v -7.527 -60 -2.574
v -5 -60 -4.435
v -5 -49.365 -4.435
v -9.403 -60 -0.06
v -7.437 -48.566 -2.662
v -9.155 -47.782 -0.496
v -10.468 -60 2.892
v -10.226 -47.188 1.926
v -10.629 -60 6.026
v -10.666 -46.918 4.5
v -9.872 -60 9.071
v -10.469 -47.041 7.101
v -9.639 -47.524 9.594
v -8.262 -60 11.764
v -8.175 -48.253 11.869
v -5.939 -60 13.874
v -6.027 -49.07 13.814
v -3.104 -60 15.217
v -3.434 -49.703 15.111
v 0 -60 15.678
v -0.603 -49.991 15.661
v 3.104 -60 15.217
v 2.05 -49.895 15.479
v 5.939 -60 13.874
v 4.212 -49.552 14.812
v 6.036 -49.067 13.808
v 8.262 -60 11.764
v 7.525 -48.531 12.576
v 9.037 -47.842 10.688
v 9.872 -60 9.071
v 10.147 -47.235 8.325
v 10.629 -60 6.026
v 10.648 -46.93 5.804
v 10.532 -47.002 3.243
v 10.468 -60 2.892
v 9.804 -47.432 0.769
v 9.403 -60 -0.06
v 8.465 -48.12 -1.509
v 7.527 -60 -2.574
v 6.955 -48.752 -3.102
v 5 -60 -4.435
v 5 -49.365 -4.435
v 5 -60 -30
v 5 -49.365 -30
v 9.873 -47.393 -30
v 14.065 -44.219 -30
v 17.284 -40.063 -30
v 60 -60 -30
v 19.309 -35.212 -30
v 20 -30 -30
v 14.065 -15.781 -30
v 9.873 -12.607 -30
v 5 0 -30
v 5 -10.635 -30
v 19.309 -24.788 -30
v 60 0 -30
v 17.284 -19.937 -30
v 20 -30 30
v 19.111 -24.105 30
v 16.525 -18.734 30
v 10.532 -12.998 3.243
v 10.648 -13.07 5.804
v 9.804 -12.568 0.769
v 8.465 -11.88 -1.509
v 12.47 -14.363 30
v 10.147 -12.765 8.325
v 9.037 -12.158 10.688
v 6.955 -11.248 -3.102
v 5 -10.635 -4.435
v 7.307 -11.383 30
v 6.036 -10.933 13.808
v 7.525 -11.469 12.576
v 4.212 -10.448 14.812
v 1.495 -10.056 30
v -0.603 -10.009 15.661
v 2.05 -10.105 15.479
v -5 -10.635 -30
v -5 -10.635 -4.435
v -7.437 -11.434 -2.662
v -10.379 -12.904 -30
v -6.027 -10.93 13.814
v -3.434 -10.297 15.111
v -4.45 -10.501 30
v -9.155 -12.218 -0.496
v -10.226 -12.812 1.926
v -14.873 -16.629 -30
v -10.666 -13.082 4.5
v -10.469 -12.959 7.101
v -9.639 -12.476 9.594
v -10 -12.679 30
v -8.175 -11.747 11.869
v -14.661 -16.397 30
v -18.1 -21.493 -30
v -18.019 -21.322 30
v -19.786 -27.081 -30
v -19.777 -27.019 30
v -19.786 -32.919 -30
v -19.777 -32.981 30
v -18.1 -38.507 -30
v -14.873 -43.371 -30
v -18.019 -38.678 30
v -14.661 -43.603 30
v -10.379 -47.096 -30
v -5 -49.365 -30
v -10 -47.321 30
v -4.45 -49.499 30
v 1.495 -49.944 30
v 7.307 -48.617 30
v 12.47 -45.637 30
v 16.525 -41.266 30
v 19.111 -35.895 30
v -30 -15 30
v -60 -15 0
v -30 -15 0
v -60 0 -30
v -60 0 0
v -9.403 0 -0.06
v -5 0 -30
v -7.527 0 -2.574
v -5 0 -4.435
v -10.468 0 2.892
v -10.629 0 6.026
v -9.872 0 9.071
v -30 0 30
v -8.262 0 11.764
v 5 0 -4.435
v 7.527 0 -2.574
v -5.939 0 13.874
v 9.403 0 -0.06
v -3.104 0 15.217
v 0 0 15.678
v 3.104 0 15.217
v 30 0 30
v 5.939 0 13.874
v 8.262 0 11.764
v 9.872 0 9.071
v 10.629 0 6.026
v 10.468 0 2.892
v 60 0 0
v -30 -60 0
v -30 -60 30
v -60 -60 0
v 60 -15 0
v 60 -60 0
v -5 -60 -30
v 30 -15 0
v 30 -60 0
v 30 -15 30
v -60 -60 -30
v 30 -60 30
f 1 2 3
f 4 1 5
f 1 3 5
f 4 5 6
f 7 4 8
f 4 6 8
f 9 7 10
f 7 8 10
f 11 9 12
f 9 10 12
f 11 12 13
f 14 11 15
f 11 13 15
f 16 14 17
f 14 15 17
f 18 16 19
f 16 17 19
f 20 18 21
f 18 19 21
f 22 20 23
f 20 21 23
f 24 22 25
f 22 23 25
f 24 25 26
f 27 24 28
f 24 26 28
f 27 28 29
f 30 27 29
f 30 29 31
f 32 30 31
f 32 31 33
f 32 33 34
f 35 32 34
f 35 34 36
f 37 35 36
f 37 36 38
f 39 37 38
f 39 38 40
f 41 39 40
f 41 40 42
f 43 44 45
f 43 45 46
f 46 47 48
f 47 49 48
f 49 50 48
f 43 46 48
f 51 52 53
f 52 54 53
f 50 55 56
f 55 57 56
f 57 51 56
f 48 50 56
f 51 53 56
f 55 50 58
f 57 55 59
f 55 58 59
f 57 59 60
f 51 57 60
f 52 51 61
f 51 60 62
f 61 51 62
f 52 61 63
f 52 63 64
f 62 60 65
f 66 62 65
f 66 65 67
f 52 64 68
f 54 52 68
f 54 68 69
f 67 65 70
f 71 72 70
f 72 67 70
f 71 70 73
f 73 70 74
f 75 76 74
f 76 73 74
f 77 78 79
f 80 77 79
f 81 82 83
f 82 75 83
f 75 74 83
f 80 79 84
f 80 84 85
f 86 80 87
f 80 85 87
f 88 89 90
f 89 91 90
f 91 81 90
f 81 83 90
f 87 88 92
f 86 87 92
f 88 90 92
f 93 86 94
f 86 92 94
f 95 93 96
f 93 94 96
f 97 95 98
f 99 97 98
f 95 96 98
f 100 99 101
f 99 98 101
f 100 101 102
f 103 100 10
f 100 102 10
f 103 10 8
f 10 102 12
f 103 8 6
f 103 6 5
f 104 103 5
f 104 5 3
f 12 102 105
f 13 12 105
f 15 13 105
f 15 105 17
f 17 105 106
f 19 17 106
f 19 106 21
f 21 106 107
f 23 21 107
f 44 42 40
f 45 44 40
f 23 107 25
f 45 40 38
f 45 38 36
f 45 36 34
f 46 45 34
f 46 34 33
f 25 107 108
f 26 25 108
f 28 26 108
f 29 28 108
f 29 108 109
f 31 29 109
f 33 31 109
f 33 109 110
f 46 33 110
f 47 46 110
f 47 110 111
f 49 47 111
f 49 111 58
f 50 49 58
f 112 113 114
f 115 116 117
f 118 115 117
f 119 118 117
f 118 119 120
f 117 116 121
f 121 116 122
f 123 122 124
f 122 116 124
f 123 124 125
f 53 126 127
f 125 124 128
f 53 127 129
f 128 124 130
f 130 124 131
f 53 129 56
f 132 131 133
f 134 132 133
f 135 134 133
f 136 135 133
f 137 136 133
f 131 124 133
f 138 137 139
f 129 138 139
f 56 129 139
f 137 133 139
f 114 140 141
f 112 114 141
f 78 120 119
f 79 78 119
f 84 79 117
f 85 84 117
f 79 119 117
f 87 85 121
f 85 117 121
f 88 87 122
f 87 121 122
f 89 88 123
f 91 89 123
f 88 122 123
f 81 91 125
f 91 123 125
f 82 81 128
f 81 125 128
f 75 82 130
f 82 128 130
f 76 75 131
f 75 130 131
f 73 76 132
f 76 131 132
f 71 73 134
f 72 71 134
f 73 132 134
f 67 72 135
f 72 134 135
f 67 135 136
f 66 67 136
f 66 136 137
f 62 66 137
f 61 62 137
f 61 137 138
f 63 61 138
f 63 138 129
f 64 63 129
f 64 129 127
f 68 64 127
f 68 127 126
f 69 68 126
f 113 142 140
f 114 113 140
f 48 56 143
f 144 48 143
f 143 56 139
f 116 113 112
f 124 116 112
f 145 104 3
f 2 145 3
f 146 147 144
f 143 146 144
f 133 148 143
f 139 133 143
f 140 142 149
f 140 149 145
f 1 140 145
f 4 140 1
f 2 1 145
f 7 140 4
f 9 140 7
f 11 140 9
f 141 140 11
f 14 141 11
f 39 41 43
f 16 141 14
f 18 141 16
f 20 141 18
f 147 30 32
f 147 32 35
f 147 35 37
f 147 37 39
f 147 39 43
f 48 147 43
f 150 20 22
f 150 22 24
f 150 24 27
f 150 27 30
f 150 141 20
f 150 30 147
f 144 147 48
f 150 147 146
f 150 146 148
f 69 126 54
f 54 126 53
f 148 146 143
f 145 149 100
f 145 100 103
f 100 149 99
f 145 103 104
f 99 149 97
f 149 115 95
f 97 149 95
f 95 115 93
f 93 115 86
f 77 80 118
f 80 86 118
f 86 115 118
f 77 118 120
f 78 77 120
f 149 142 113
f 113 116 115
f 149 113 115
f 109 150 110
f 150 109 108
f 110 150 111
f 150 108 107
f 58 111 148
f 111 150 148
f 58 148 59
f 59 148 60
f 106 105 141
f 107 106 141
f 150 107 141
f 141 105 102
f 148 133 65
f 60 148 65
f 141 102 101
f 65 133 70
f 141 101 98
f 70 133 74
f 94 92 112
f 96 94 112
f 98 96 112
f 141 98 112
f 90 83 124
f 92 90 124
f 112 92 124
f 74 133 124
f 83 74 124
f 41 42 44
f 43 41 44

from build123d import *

# Parameters (mm, degrees)
F1_DEPTH = 60
F2_W     = 30
F2_H     = 30
F3_DEPTH = 45
F5_DEPTH = 15.001
F7_DEPTH = 15.001
F8_R     = 20
F9_DEPTH = 60.001


with BuildPart() as f1:
    # F0 (on Front) → F1 (new body)
    with BuildSketch(Plane.XZ):
        with BuildLine():
            Line((60, 30), (-60, 30))
            Line((-60, 30), (-60, -30))
            Line((-60, -30), (-5, -30))
            Line((-5, -30), (-5, -4.434966))
            ThreePointArc((-5, -4.434966), (0, 15.677948), (5, -4.434966))
            Line((5, -4.434966), (5, -30))
            Line((5, -30), (60, -30))
            Line((60, -30), (60, 30))
        make_face()
    extrude(amount=F1_DEPTH)

    # F2 (on face) → F3 (cut)
    with BuildSketch(Plane.XZ.offset(60)):
        with Locations((-45, 15)):
            Rectangle(F2_W, F2_H)
        with Locations((45, 15)):
            Rectangle(F2_W, F2_H)
    extrude(amount=-F3_DEPTH, mode=Mode.SUBTRACT)

    # F4 (on face) → F5 (cut, through all)
    with BuildSketch(Plane.XZ.offset(15)):
        Polygon((-60, 0), (-30, 30), (-60, 30), align=None)
    extrude(amount=-F5_DEPTH, mode=Mode.SUBTRACT)

    # F6 (on face) → F7 (cut, through all)
    with BuildSketch(Plane.XZ.offset(15)):
        Polygon((60, 30), (30, 30), (60, 0), align=None)
    extrude(amount=-F7_DEPTH, mode=Mode.SUBTRACT)

    # F8 (on face) → F9 (cut, through all)
    with BuildSketch(Plane.XY.offset(30)):
        with Locations((0, -30)):
            Circle(F8_R)
    extrude(amount=-F9_DEPTH, mode=Mode.SUBTRACT)


solid = f1.part
